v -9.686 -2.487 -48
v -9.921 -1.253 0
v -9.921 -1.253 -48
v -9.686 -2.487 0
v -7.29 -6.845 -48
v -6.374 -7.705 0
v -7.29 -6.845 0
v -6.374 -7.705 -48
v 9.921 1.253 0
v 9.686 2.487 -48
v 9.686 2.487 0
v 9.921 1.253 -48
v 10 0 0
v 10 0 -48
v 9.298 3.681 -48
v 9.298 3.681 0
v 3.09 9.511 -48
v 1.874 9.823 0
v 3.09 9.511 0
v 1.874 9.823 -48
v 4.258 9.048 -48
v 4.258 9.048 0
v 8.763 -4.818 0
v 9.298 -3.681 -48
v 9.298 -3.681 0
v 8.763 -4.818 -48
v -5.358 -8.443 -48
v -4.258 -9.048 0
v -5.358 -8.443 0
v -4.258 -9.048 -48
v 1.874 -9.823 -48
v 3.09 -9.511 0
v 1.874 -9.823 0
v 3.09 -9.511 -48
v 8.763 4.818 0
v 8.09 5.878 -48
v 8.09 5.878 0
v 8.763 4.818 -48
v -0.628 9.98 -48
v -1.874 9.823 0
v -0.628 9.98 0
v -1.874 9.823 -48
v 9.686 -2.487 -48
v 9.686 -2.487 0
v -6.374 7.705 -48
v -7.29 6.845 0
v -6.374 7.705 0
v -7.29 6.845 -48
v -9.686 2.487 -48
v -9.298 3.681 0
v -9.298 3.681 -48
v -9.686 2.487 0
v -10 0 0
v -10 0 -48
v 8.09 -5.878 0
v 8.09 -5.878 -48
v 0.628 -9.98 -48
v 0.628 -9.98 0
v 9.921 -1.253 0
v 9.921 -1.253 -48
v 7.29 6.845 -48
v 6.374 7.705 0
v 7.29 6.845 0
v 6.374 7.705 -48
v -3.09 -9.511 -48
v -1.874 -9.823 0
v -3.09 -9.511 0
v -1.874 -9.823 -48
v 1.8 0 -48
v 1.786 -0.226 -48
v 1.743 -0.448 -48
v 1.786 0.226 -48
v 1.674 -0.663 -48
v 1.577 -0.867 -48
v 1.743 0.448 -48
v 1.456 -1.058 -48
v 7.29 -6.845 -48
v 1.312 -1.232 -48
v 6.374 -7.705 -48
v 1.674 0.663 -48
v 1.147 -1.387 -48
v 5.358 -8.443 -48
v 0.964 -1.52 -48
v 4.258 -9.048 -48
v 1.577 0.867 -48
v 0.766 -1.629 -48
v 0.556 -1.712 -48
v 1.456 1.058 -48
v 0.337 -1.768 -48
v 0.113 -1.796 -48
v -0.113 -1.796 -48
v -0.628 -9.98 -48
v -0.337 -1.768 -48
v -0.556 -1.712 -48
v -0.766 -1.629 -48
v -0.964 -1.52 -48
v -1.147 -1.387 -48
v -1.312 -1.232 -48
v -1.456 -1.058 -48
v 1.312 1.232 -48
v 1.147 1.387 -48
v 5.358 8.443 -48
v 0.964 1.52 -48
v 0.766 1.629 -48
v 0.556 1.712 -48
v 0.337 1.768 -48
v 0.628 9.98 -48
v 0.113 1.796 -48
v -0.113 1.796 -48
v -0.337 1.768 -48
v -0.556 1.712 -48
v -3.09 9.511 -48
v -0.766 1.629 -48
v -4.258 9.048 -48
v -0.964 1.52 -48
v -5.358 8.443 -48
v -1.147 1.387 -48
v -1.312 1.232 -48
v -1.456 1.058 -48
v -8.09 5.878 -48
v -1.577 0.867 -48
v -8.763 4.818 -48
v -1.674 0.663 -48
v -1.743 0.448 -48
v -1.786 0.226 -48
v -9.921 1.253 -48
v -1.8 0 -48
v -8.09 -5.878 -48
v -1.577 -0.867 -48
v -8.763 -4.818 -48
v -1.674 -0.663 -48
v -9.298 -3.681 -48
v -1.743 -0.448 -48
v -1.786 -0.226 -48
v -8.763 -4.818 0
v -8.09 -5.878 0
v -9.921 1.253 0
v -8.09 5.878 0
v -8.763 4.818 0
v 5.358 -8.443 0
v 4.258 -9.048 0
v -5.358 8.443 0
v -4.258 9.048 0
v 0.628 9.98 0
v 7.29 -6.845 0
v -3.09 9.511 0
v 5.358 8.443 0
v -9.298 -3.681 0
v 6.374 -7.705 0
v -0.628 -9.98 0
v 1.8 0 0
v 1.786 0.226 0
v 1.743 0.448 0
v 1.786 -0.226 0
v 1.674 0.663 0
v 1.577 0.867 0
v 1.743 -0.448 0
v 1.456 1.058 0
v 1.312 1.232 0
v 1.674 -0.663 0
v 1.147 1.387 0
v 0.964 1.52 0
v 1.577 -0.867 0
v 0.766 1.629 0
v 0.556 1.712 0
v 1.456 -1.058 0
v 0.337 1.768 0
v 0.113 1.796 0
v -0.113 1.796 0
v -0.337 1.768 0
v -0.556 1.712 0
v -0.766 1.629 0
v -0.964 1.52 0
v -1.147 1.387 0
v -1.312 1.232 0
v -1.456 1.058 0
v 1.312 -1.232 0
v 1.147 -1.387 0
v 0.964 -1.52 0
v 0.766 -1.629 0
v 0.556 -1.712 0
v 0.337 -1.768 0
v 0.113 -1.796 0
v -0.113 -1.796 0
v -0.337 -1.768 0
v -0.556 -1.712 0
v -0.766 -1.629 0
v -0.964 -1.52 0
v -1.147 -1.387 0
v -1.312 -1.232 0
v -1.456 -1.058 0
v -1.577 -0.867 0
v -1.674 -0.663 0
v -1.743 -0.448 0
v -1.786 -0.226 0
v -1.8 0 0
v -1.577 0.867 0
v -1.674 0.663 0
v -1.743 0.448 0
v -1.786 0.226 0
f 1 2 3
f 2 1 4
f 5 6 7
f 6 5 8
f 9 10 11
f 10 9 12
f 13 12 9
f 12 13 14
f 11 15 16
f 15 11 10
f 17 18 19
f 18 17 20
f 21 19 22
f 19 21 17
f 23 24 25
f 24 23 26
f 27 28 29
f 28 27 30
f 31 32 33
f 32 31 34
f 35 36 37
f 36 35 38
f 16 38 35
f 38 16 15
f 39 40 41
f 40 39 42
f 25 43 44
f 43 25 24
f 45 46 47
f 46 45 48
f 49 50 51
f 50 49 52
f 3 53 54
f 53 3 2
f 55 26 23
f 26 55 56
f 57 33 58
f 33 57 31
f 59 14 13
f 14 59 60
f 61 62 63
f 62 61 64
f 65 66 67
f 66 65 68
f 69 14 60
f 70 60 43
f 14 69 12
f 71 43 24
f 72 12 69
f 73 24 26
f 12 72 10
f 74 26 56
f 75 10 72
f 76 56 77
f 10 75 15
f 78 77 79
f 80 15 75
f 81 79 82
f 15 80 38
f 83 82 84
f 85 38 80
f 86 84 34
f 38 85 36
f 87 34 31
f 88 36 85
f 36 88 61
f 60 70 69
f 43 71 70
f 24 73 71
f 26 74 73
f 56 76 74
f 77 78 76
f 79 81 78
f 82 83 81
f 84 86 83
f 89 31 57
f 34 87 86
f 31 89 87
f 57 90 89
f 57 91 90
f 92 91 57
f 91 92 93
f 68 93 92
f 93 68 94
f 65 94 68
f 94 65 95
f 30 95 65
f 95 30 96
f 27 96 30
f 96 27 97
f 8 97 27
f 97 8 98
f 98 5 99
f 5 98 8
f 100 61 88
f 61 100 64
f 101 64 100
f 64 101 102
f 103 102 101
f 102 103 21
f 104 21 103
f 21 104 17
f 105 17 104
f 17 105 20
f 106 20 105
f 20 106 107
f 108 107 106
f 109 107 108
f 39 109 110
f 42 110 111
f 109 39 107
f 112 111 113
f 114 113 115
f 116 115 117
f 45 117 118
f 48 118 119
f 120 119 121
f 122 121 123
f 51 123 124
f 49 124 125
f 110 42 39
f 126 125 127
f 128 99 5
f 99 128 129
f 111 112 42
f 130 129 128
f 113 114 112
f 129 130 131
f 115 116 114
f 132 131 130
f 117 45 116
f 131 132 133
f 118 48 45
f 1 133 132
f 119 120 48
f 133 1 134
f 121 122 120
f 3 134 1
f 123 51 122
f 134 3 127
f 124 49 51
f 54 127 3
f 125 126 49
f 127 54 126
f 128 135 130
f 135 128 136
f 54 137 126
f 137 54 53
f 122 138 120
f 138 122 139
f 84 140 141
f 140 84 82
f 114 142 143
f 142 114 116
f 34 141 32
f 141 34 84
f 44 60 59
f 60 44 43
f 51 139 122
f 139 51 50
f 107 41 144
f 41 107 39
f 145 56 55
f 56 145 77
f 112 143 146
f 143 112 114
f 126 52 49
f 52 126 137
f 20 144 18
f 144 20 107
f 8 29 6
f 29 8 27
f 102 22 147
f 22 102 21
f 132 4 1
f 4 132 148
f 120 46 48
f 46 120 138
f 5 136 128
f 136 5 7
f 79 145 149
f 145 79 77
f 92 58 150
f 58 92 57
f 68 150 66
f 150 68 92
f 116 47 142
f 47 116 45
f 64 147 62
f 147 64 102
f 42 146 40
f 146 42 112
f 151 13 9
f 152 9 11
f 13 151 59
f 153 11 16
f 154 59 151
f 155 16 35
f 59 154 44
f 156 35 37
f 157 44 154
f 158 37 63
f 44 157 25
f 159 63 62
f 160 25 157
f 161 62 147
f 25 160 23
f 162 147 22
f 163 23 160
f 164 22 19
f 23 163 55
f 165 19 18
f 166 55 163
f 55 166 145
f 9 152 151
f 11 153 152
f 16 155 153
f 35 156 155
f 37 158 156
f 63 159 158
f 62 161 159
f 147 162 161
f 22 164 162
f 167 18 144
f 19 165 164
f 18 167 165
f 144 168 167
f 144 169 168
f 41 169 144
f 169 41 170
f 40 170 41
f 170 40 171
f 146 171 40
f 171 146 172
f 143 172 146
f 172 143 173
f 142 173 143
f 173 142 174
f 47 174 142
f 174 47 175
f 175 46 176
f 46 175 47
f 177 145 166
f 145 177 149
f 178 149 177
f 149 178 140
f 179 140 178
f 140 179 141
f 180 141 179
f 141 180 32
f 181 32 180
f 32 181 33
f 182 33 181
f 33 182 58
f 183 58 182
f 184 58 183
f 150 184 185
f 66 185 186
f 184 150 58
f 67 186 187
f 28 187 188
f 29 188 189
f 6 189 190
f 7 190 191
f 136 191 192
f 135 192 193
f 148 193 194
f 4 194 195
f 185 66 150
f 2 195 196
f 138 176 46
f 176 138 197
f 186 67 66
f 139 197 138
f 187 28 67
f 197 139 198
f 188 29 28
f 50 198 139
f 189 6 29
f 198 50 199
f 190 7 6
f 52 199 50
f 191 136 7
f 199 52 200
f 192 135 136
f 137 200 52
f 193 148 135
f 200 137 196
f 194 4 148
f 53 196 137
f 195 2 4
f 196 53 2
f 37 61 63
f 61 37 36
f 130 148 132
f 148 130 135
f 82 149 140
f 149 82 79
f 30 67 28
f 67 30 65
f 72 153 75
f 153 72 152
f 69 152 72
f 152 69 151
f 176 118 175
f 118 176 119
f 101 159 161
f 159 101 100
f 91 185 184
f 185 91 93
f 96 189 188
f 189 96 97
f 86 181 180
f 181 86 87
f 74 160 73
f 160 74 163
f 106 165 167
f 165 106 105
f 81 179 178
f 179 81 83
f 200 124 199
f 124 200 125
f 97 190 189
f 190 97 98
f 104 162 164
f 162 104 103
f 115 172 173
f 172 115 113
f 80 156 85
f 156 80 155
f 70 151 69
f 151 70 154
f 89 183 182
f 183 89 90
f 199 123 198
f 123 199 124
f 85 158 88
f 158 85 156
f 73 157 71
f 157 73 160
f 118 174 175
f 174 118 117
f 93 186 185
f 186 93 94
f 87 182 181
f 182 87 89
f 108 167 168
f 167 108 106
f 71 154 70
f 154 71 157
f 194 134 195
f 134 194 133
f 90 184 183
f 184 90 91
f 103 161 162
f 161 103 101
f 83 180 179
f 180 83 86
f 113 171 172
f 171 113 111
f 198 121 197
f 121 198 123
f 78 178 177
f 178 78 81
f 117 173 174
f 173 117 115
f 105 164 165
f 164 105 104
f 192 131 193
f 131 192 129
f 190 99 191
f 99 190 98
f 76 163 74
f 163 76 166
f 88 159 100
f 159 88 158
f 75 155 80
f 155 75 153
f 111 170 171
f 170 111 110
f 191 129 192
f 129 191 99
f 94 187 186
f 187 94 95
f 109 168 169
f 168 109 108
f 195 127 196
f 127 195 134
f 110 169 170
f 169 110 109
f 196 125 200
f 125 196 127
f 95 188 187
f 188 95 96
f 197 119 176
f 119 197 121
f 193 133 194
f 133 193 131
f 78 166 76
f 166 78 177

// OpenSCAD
$fn = 50;


difference() {
	union() {
		translate(v = [0, 0, -48.0000000000]) {
			cylinder(h = 48, r = 10.0000000000);
		}
		cylinder(h = 0, r = 20.0000000000);
	}
	union() {
		#translate(v = [0, 0, -48]) {
			cylinder(h = 48, r = 1.8000000000);
		}
	}
}
